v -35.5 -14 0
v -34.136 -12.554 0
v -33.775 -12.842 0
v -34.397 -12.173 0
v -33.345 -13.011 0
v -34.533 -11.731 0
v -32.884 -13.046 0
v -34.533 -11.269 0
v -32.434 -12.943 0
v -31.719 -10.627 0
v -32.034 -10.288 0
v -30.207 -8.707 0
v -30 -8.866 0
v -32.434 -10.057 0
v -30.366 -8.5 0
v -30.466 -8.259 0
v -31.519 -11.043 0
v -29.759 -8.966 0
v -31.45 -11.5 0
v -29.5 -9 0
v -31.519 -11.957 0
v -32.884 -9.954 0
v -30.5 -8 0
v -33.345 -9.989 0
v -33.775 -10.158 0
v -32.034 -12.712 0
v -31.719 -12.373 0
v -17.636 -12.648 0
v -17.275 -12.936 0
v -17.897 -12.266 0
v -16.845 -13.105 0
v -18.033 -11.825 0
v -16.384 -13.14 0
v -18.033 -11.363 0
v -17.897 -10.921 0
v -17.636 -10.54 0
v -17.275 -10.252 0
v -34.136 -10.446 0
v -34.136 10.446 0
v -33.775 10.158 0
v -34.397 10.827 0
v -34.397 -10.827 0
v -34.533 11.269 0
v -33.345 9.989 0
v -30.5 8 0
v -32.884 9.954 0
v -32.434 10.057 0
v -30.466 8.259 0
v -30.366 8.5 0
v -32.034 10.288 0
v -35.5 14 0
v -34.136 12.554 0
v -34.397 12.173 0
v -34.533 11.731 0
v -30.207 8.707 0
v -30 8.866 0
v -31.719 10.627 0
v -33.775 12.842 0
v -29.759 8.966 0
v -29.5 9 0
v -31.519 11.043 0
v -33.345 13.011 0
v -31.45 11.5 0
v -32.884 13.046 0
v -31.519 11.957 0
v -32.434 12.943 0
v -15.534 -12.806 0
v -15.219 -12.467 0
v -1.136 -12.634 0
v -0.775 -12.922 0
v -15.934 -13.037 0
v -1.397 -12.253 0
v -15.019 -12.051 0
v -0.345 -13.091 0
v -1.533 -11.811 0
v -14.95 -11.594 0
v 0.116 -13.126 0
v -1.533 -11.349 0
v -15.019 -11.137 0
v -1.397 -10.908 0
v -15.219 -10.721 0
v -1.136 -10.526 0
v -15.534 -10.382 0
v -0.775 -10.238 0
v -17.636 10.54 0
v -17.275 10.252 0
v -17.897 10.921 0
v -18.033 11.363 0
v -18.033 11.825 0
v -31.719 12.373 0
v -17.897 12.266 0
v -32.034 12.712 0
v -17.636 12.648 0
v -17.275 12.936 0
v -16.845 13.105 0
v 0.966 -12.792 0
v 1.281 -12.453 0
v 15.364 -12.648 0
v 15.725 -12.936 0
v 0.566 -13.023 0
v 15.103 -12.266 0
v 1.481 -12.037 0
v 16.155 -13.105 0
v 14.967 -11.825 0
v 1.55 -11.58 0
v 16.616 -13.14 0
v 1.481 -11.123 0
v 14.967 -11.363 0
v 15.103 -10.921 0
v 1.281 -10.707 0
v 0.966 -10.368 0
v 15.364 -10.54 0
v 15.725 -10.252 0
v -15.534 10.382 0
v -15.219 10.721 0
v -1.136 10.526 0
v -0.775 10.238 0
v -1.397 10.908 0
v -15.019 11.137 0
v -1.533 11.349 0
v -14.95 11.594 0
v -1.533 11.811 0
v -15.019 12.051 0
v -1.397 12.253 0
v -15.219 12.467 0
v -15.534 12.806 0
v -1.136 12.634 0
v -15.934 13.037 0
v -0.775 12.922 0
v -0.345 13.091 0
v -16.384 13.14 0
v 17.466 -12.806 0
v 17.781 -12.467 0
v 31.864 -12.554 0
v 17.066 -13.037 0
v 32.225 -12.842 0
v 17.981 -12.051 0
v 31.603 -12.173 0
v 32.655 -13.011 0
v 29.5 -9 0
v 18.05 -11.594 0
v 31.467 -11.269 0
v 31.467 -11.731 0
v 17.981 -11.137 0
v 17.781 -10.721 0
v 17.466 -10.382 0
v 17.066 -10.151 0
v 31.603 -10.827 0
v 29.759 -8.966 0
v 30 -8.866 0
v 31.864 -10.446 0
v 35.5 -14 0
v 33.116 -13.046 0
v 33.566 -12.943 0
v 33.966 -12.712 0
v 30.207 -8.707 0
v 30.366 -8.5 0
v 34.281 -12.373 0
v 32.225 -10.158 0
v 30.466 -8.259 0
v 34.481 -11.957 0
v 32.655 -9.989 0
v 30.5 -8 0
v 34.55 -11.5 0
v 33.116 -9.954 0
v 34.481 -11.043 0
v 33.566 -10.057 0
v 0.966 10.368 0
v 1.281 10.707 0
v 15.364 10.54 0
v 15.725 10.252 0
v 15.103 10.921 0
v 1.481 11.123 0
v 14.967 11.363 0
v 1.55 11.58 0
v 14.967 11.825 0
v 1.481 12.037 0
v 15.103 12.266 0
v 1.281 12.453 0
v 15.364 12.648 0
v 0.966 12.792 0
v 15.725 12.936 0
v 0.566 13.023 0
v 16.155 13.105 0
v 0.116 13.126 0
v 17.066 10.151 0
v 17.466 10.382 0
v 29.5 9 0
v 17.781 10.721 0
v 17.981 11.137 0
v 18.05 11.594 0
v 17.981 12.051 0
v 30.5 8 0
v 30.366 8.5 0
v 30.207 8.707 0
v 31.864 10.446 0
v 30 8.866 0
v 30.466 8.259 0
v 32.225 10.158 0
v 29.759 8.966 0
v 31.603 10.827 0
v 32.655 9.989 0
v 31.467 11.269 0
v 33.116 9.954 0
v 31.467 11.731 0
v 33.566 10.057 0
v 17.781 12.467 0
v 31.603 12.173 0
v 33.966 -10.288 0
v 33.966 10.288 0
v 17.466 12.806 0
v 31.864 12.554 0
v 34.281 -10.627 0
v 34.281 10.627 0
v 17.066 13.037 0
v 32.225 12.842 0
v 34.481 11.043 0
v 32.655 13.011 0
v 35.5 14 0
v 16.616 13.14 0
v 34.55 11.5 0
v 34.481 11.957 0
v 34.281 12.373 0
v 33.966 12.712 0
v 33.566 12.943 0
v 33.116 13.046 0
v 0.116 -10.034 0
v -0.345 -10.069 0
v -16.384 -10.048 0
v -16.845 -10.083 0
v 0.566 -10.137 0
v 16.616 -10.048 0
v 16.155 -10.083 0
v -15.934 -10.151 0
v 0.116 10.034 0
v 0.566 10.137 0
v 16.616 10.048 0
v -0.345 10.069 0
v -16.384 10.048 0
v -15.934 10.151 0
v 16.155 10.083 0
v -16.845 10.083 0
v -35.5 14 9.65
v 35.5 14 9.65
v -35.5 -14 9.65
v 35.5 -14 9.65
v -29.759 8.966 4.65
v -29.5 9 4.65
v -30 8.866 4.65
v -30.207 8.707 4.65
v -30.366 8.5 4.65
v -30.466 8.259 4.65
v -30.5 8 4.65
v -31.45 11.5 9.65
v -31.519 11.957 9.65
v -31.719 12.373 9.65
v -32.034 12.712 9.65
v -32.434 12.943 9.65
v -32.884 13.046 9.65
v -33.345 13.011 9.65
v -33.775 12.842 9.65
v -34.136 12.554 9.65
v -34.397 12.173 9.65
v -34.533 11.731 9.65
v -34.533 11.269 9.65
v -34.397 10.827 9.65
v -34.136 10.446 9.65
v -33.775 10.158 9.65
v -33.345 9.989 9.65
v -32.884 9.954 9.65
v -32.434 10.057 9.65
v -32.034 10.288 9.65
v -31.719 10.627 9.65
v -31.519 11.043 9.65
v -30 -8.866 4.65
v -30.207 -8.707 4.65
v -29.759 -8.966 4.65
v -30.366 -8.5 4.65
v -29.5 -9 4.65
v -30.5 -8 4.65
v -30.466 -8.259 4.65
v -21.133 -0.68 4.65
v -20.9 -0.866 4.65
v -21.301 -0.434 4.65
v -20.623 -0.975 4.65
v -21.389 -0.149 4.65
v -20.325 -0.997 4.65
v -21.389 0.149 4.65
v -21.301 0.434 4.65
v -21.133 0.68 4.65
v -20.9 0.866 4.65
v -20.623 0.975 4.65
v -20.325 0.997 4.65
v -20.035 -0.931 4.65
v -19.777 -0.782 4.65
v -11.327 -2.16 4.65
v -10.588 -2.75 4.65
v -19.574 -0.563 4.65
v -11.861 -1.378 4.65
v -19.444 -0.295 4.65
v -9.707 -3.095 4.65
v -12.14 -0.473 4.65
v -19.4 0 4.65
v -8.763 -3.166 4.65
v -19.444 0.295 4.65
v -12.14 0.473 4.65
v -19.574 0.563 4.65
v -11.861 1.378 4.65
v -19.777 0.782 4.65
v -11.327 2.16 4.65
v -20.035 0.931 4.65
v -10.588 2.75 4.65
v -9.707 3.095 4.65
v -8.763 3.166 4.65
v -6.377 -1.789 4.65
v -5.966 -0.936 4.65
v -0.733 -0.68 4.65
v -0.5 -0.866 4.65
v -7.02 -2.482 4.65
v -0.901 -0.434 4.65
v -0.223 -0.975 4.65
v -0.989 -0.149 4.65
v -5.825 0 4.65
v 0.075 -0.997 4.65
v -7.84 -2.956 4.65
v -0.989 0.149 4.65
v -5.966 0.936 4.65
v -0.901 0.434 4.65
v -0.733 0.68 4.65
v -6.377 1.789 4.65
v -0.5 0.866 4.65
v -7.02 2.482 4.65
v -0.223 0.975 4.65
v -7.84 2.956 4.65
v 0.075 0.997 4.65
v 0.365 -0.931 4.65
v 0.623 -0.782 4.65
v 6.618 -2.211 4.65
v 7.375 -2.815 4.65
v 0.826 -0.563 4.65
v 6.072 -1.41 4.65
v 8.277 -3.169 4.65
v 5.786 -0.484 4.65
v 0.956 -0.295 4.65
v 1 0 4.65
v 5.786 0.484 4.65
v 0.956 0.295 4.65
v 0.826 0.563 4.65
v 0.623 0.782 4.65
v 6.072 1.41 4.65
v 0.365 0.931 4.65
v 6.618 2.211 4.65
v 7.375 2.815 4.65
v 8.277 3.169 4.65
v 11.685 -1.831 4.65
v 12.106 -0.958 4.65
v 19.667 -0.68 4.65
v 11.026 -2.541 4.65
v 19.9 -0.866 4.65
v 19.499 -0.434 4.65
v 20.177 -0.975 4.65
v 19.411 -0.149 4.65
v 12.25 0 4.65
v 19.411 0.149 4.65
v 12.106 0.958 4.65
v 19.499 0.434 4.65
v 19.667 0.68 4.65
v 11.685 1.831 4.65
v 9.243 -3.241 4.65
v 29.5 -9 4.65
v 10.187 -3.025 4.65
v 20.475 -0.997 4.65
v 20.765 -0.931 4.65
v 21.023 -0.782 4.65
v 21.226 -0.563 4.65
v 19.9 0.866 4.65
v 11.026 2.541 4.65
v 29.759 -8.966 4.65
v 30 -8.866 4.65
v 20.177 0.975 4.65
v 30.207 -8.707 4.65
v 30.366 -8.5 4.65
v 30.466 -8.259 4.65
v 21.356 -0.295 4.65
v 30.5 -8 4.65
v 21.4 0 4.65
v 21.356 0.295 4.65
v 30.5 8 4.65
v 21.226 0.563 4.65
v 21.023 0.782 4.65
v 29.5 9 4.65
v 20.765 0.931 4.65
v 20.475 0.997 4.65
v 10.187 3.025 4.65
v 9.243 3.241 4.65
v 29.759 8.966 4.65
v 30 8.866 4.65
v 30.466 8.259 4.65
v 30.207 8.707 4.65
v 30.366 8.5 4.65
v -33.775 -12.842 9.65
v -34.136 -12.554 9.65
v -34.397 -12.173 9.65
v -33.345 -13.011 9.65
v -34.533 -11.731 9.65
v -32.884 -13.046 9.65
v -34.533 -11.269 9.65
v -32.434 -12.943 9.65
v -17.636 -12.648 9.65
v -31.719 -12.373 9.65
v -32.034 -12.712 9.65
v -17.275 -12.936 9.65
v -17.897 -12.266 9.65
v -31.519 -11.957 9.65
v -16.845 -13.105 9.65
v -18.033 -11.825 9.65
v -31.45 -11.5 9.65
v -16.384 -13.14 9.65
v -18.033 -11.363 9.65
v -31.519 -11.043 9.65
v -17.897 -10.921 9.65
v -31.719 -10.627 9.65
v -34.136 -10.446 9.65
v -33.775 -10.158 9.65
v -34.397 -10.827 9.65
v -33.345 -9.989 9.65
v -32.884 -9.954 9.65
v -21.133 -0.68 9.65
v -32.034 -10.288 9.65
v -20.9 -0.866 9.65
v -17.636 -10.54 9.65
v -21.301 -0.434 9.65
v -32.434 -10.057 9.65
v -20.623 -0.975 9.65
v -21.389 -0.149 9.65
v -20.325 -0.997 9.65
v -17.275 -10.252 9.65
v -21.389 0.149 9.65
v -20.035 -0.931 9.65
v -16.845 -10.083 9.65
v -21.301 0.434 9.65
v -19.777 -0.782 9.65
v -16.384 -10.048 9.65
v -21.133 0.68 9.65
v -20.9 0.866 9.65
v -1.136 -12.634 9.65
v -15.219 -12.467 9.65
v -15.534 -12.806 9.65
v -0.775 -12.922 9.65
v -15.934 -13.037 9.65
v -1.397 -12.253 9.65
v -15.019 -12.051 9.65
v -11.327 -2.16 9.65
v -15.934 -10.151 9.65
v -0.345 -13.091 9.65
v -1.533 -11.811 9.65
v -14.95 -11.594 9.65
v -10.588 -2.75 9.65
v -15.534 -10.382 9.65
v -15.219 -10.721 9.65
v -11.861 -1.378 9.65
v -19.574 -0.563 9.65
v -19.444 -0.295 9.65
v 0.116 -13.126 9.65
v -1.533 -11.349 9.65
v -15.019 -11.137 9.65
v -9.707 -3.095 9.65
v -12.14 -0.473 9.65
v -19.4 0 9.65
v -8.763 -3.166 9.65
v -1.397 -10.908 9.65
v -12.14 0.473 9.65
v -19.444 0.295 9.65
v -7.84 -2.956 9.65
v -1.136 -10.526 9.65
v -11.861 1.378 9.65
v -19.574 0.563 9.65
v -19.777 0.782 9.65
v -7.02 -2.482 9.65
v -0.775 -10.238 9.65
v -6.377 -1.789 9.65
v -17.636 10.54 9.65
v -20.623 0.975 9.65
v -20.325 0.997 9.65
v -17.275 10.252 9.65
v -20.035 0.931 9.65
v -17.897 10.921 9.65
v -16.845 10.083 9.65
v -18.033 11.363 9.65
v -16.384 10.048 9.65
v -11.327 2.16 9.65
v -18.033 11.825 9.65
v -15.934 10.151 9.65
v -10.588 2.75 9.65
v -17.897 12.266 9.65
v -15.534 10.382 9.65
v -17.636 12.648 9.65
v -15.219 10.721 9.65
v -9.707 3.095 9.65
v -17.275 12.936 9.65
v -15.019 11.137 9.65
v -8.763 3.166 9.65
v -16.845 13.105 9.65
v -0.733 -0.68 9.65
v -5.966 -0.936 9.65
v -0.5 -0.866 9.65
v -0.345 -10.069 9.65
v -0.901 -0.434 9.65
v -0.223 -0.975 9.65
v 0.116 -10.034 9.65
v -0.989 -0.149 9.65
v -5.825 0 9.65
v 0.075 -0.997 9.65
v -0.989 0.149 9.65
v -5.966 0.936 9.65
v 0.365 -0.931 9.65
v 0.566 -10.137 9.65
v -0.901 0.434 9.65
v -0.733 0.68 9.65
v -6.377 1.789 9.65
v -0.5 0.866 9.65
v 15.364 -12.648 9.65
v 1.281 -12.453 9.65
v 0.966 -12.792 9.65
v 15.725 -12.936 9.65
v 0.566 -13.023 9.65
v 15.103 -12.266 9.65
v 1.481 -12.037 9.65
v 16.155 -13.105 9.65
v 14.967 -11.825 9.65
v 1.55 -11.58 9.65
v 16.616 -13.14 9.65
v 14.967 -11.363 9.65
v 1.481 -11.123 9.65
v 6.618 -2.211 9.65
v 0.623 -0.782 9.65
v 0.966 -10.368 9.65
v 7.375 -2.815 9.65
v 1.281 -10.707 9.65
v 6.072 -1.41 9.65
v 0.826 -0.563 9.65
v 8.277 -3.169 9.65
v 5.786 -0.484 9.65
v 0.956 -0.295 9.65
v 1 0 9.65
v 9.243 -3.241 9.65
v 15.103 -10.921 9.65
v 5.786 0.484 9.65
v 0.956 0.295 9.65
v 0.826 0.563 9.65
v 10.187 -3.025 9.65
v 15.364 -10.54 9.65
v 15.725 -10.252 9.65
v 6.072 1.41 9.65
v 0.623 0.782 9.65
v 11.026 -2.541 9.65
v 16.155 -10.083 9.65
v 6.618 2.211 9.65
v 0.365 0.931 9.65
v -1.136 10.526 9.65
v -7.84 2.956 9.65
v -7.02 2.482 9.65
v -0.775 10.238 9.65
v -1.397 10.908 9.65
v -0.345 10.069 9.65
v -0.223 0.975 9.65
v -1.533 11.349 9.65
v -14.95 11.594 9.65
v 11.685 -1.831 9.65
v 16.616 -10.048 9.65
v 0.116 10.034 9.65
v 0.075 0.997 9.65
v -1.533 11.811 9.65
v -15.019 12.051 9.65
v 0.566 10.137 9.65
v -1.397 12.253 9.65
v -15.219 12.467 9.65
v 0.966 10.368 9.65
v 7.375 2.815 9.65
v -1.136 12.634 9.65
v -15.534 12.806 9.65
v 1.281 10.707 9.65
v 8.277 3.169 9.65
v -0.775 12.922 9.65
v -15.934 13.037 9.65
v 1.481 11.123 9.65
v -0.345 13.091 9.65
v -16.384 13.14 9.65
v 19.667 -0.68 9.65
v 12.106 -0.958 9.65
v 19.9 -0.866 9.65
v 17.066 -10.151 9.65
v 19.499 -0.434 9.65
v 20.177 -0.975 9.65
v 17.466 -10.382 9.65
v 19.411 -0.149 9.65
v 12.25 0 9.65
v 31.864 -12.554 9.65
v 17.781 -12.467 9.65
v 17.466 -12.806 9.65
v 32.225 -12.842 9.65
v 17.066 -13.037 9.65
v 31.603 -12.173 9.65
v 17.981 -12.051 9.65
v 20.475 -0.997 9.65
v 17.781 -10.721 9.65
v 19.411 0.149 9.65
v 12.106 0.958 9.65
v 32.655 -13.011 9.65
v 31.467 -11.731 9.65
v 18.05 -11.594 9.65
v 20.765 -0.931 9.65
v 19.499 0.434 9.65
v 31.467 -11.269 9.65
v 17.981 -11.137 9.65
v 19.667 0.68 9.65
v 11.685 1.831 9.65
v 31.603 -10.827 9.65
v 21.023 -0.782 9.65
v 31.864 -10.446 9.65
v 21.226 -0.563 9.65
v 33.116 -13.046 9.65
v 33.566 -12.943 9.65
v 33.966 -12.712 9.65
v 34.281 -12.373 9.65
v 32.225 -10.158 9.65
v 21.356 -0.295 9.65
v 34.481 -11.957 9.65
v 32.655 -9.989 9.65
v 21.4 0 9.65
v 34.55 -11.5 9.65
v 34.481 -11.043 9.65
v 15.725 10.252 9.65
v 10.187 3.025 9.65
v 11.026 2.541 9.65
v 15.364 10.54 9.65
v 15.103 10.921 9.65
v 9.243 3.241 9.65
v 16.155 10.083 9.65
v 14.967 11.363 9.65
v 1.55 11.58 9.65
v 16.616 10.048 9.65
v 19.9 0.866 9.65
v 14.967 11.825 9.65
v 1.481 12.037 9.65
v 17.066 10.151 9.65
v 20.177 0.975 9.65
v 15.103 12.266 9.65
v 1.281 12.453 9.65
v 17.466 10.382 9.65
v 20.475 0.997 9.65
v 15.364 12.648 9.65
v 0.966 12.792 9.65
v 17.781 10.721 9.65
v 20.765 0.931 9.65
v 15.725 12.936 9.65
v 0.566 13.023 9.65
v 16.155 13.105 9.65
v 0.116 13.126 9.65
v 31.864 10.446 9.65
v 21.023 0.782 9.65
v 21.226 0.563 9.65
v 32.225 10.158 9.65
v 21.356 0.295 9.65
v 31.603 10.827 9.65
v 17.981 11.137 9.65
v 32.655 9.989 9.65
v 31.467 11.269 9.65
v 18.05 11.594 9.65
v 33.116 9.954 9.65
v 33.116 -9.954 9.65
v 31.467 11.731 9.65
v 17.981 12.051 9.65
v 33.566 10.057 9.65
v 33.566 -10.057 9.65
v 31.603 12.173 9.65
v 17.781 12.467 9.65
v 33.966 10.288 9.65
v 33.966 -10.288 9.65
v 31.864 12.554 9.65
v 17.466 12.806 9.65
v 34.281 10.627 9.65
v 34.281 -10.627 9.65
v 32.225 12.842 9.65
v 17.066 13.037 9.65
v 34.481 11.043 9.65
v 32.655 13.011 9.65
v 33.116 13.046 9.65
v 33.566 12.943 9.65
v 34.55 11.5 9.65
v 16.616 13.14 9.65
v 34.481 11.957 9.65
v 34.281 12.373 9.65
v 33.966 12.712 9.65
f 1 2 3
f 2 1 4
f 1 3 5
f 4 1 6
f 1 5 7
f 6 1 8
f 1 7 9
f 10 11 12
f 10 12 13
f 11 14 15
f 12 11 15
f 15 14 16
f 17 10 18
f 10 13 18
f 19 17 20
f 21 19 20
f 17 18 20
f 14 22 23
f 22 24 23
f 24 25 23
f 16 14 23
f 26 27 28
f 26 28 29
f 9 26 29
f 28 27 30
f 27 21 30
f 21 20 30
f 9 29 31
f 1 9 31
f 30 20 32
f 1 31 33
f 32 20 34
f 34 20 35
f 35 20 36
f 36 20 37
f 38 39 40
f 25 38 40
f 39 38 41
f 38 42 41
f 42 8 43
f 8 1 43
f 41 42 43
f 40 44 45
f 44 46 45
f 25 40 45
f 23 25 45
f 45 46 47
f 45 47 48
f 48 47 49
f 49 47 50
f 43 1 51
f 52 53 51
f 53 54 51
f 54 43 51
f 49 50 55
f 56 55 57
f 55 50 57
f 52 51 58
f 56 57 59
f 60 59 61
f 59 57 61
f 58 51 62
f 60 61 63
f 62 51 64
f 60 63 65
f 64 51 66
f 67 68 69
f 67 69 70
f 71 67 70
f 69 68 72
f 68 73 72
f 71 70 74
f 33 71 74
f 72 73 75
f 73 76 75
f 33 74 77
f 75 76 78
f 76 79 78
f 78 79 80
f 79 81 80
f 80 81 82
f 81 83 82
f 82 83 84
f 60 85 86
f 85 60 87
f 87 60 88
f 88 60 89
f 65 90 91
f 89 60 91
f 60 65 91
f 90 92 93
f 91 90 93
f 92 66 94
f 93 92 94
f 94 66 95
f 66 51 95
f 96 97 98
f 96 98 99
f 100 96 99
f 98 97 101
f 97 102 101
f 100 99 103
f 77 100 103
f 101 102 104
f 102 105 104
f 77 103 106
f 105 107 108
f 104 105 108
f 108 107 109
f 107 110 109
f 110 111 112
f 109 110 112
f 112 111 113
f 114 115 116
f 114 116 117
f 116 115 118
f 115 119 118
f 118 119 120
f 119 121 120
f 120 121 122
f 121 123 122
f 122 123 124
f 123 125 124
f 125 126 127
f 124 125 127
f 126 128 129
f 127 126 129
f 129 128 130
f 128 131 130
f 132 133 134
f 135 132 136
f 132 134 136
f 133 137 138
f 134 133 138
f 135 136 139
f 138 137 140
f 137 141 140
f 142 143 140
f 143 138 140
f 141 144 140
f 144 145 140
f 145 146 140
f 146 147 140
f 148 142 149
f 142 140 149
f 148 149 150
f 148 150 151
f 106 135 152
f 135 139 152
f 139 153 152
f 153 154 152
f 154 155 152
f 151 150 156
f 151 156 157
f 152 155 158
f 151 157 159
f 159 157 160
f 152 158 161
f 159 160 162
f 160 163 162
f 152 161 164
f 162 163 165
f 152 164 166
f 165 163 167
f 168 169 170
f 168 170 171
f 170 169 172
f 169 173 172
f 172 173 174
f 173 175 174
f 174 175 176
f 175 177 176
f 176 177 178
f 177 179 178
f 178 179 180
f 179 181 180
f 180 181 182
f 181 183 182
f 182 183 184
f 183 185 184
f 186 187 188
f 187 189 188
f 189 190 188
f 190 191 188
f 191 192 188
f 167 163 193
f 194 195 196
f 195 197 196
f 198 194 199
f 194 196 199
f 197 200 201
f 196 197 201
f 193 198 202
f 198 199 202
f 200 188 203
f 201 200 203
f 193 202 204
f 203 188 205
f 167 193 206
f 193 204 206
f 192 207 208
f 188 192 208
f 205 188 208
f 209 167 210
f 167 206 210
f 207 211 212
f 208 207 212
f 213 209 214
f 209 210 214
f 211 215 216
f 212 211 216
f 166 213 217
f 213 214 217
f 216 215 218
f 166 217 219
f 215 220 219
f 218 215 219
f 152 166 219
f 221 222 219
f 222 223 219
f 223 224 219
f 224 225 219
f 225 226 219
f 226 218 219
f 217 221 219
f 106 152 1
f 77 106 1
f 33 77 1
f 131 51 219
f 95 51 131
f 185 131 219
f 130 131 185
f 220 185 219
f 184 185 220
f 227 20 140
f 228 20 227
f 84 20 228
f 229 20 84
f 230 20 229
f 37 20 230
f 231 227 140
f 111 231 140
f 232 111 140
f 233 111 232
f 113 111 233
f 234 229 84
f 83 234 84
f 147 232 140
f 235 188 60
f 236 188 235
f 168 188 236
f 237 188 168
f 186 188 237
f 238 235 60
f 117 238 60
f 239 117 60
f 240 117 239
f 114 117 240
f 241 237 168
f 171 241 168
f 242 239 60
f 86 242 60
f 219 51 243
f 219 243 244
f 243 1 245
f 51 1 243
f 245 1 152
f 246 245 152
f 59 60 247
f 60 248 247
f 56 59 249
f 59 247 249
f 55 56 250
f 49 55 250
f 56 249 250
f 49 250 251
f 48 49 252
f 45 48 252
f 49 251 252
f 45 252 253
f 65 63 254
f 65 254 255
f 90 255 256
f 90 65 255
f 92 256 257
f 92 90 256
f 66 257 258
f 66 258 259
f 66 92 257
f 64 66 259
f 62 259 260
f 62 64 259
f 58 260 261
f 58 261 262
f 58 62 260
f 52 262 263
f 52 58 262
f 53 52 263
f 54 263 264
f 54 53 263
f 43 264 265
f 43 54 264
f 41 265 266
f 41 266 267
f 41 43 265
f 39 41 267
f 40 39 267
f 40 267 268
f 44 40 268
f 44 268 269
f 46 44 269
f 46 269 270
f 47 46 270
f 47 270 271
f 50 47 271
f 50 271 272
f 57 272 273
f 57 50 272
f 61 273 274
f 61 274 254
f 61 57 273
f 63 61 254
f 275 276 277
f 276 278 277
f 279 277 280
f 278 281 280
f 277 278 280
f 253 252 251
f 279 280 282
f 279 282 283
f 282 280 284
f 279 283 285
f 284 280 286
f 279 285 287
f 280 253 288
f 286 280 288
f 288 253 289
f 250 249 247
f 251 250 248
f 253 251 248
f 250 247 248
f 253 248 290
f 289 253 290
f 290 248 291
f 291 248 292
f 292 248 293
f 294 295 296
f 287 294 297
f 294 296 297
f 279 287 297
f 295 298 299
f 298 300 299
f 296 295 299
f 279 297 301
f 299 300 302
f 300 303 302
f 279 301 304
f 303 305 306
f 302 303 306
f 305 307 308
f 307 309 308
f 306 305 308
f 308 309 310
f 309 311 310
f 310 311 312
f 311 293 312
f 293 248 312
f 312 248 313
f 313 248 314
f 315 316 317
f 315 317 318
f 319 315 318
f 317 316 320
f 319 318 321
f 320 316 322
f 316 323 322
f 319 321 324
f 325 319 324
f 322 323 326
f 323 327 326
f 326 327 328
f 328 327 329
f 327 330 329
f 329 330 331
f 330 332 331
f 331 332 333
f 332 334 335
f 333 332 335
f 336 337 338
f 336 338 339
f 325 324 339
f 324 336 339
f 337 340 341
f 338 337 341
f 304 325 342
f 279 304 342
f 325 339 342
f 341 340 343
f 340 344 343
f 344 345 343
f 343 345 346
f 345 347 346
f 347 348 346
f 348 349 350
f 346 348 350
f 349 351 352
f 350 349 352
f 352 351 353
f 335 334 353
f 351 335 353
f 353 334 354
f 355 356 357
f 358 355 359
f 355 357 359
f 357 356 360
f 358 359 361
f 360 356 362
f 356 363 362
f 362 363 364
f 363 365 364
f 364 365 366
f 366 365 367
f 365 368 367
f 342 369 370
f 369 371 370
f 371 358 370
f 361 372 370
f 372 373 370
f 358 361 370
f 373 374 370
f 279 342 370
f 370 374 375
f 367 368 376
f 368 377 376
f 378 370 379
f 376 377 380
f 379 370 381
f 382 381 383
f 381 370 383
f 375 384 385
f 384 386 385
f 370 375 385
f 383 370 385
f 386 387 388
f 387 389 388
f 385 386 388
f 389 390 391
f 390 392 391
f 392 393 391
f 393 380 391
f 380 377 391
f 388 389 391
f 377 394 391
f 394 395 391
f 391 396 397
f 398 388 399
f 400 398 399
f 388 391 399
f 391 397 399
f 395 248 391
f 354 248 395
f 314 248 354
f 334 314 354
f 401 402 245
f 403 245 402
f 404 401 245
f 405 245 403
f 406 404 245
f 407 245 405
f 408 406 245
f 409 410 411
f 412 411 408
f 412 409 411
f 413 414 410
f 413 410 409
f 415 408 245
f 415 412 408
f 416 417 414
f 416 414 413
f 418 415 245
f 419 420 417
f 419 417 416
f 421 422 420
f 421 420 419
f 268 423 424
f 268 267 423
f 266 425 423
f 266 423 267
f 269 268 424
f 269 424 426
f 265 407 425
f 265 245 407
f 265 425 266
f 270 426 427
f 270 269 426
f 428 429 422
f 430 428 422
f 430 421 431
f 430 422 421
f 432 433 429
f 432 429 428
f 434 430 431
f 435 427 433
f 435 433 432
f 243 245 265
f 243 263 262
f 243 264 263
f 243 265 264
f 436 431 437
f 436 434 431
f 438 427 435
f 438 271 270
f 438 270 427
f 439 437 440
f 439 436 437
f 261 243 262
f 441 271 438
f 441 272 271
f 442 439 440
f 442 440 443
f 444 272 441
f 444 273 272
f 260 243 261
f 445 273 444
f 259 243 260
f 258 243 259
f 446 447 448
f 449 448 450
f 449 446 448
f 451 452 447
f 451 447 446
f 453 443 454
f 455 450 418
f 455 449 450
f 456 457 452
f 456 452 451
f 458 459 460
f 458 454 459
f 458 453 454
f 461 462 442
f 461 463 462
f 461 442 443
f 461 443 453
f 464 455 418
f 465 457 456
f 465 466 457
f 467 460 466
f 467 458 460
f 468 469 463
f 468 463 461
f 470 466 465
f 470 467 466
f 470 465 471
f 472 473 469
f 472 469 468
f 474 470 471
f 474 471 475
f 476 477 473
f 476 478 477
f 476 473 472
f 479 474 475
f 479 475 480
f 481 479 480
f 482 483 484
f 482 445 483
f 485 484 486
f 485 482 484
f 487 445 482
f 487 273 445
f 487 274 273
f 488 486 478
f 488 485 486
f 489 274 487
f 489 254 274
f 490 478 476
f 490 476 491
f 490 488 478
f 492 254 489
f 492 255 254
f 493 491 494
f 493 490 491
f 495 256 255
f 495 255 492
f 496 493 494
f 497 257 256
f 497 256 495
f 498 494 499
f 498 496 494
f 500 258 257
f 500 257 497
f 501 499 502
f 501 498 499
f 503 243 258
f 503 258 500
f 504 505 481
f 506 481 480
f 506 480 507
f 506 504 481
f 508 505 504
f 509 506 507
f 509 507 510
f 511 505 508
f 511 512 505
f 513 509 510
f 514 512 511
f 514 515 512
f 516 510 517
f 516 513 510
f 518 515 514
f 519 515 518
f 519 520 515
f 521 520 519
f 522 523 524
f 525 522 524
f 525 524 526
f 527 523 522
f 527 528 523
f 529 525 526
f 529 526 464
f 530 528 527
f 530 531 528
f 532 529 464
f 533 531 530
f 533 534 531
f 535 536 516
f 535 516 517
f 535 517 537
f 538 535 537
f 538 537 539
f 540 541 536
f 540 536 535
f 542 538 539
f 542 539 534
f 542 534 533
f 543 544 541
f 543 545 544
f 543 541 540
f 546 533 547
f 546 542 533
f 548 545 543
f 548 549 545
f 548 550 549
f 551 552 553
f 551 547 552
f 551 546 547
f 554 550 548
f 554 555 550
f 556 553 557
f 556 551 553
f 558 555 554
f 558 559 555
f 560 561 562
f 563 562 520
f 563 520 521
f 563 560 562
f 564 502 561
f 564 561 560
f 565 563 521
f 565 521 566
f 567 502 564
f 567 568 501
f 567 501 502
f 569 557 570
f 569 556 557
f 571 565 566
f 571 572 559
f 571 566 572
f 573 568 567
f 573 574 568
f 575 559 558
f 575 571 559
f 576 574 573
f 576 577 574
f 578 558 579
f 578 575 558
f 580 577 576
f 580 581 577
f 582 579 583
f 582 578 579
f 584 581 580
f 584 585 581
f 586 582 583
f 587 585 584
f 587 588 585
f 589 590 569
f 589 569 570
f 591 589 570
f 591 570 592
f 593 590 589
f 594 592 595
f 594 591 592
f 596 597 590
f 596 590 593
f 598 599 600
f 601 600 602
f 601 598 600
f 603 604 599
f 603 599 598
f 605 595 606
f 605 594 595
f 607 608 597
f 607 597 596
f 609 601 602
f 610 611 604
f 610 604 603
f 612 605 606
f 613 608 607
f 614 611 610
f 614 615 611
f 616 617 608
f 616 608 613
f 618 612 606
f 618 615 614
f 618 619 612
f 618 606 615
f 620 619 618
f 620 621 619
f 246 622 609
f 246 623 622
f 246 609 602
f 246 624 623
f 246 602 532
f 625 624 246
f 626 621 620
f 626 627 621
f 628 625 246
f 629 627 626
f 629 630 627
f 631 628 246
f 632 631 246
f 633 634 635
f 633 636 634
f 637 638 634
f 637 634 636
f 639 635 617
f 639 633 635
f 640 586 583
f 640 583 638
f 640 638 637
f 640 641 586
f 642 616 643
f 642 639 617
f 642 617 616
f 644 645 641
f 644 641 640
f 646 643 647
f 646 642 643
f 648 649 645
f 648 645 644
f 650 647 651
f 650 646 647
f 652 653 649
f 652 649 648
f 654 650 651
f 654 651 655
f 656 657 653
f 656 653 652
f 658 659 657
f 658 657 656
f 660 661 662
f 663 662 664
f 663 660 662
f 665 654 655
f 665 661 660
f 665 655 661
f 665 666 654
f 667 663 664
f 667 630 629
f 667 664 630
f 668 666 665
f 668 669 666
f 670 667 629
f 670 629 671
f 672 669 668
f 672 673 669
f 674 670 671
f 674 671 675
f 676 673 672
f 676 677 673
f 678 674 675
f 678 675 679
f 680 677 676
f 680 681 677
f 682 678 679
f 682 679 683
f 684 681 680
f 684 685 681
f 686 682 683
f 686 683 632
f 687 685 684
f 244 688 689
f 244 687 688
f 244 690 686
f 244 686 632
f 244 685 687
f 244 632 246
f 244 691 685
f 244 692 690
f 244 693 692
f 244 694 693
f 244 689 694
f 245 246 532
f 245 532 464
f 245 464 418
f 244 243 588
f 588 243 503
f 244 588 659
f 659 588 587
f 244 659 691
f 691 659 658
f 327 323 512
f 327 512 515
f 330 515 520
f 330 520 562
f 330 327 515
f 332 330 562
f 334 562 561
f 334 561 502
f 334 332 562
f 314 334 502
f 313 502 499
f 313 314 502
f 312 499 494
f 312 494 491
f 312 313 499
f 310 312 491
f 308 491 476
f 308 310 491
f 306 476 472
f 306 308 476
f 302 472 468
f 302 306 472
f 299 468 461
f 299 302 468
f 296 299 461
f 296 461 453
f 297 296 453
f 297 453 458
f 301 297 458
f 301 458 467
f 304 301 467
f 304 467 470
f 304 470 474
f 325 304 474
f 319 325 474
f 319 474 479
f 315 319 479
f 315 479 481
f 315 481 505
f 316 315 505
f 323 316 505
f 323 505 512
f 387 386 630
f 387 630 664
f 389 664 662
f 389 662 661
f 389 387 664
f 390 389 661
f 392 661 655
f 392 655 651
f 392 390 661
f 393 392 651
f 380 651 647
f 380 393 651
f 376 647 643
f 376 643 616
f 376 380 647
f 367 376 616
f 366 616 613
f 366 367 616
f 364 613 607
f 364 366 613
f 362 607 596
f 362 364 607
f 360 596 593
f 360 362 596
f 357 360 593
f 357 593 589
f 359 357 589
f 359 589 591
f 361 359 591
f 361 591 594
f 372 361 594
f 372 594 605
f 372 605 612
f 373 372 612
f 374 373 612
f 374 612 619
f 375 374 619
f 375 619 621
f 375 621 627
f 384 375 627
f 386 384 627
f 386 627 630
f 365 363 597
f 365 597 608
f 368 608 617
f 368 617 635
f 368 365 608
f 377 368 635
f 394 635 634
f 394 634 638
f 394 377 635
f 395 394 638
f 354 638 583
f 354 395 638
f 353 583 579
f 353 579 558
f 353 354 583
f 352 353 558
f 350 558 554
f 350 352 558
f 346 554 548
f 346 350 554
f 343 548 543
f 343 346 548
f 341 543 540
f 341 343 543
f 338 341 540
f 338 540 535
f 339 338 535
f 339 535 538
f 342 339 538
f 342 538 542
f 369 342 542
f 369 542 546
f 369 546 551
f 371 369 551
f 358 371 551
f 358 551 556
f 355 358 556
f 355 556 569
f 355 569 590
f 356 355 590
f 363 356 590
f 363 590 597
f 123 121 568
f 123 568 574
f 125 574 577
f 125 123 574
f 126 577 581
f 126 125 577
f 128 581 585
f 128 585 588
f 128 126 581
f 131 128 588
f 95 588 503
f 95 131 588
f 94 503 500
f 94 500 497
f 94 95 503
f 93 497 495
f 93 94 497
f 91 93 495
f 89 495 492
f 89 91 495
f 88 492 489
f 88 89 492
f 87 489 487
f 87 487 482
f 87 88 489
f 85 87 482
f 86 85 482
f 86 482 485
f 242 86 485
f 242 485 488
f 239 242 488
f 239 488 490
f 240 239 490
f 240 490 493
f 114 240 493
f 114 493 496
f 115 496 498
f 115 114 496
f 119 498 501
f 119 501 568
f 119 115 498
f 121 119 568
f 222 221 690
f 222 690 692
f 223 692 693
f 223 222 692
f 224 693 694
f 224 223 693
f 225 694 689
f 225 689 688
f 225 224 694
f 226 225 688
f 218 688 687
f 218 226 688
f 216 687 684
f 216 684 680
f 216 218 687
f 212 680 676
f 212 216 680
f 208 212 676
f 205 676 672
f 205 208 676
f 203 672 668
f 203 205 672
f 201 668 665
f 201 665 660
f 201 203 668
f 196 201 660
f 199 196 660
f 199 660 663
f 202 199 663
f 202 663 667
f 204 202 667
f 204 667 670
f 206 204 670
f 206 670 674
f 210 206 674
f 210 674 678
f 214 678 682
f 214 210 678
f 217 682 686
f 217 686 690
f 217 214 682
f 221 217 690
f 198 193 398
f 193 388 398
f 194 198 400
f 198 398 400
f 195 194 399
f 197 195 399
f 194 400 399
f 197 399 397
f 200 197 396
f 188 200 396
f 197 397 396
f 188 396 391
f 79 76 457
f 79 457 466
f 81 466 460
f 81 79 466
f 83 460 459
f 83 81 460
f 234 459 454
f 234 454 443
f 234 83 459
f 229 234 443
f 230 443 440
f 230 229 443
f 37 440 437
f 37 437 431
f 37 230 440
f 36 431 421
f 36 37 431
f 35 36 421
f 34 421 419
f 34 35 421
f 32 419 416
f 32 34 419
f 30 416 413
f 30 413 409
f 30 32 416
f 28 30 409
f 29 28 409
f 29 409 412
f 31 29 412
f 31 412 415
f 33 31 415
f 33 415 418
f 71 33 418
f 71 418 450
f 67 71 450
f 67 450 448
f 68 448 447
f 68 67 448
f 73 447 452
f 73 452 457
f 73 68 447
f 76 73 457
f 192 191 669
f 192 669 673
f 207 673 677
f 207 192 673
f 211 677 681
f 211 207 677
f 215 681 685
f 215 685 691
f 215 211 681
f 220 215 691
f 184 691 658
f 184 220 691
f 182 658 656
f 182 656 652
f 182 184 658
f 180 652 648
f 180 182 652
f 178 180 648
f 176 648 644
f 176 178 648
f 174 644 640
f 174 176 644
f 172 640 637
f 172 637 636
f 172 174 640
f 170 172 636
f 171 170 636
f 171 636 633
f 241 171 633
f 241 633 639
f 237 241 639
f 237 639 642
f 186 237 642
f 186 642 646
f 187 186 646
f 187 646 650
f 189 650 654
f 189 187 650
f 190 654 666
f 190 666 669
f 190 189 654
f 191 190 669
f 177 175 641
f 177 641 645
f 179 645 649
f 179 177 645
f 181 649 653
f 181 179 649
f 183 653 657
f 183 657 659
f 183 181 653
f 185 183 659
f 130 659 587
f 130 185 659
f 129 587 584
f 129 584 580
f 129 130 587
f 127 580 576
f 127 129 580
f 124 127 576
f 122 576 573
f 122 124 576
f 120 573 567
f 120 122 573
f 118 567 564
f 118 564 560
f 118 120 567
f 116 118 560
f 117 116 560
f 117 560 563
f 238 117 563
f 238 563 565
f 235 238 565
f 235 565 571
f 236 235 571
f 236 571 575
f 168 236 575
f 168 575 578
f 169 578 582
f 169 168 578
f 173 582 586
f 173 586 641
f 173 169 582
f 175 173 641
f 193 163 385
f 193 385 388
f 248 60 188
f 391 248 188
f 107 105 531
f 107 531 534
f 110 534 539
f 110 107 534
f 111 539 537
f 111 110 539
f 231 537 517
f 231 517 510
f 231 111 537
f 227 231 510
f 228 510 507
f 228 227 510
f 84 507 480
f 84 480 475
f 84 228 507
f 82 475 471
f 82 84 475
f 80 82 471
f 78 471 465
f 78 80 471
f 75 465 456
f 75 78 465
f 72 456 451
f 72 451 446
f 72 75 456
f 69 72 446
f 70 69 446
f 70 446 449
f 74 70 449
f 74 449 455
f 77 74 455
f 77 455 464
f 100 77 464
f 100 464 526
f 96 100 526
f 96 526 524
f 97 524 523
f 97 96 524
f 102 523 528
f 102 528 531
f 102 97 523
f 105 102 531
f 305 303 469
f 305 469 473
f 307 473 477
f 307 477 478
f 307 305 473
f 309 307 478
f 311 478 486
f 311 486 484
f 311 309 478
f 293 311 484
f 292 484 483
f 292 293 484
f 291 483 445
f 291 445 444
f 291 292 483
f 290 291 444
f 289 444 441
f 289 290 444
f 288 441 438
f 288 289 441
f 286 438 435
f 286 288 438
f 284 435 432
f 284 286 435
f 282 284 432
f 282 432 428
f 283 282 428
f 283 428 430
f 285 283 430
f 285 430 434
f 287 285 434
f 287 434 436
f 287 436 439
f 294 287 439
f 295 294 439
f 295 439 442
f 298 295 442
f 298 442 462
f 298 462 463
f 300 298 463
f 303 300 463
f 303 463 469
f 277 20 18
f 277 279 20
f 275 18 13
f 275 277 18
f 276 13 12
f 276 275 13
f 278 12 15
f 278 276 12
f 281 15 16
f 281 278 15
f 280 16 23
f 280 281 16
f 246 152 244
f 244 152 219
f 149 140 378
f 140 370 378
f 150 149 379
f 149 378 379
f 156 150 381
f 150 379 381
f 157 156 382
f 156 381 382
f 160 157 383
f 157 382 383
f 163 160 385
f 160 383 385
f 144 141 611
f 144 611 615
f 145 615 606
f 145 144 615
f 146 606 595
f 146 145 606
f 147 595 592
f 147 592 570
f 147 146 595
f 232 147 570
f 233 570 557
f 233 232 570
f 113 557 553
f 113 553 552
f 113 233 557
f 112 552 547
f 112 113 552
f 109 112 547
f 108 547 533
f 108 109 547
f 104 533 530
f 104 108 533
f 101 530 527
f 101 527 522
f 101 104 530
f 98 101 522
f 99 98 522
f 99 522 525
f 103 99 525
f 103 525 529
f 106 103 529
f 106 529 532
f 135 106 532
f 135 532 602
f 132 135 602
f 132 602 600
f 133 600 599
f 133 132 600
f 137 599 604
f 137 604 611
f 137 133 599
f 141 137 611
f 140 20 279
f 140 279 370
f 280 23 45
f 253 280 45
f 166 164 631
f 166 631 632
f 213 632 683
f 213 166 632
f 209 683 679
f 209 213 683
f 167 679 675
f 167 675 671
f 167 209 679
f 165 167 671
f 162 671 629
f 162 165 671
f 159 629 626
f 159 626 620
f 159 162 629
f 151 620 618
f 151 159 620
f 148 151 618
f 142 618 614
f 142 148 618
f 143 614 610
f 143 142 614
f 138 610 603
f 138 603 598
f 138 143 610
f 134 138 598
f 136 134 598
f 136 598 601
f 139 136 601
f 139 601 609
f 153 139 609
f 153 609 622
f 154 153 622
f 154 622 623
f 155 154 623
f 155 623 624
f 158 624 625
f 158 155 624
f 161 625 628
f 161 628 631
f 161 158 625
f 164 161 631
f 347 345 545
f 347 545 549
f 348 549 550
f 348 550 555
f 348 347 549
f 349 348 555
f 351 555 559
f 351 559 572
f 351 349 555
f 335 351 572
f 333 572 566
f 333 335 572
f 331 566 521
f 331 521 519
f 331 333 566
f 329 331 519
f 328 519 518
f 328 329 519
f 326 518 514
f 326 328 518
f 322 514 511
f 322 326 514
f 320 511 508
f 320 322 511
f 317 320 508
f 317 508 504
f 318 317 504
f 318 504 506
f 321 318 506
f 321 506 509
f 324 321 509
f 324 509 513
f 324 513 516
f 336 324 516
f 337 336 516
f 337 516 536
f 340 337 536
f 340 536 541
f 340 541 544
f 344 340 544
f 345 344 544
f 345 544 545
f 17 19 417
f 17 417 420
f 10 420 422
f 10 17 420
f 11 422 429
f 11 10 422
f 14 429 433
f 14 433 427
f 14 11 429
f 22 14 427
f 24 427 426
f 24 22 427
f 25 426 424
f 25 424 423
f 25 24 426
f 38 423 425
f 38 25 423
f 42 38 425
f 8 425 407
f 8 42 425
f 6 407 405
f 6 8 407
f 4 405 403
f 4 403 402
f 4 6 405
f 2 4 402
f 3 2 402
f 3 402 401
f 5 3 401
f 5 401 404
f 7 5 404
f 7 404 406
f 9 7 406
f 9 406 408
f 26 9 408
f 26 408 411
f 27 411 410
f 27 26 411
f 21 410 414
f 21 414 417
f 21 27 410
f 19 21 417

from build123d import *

# Parameters (mm, degrees)
F0_W     = 71
F0_H     = 28
F0_R     = 1.55
F0_W_2   = 61
F0_H_2   = 18
F0_R_2   = 1
F0_R_3   = 3.175
F0_R_4   = 3.25
F1_DEPTH = 9.65
F2_DEPTH = 4.65
F3_R     = 1


with BuildPart() as f1:
    # F0 (on Top) → F1 (new body)
    with BuildSketch(Plane.XY):
        Rectangle(F0_W, F0_H)
        with Locations((-33, -11.5)):
            Circle(F0_R, mode=Mode.SUBTRACT)
        with Locations((-16.5, -11.593945)):
            Circle(F0_R, mode=Mode.SUBTRACT)
        with Locations((0, -11.580119)):
            Circle(F0_R, mode=Mode.SUBTRACT)
        with Locations((16.5, -11.593945)):
            Circle(F0_R, mode=Mode.SUBTRACT)
        with Locations((33, -11.5)):
            Circle(F0_R, mode=Mode.SUBTRACT)
        with Locations((-33, 11.5)):
            Circle(F0_R, mode=Mode.SUBTRACT)
        with Locations((-16.5, 11.593945)):
            Circle(F0_R, mode=Mode.SUBTRACT)
        Rectangle(F0_W_2, F0_H_2, mode=Mode.SUBTRACT)
        with Locations((0, 11.580119)):
            Circle(F0_R, mode=Mode.SUBTRACT)
        with Locations((16.5, 11.593945)):
            Circle(F0_R, mode=Mode.SUBTRACT)
        with Locations((33, 11.5)):
            Circle(F0_R, mode=Mode.SUBTRACT)
        Rectangle(F0_W_2, F0_H_2)
        with Locations((-20.4, 0)):
            Circle(F0_R_2, mode=Mode.SUBTRACT)
        with Locations((-9, 0)):
            Circle(F0_R_3, mode=Mode.SUBTRACT)
        Circle(F0_R_2, mode=Mode.SUBTRACT)
        with Locations((9, 0)):
            Circle(F0_R_4, mode=Mode.SUBTRACT)
        with Locations((20.4, 0)):
            Circle(F0_R_2, mode=Mode.SUBTRACT)
    extrude(amount=F1_DEPTH)

    # F0 (on Top) → F2 (cut)
    with BuildSketch(Plane.XY):
        Rectangle(F0_W_2, F0_H_2)
        with Locations((-20.4, 0)):
            Circle(F0_R_2, mode=Mode.SUBTRACT)
        with Locations((-9, 0)):
            Circle(F0_R_3, mode=Mode.SUBTRACT)
        Circle(F0_R_2, mode=Mode.SUBTRACT)
        with Locations((9, 0)):
            Circle(F0_R_4, mode=Mode.SUBTRACT)
        with Locations((20.4, 0)):
            Circle(F0_R_2, mode=Mode.SUBTRACT)
    extrude(amount=F2_DEPTH, mode=Mode.SUBTRACT)

    # F3
    f3_edges = [f1.edges().sort_by_distance(p)[0] for p in [
        (-30.5, -9, 2.325),
        (30.5, -9, 2.325),
        (-30.5, 9, 2.325),
        (30.5, 9, 2.325),
    ]]
    fillet(f3_edges, radius=F3_R)


solid = f1.part
